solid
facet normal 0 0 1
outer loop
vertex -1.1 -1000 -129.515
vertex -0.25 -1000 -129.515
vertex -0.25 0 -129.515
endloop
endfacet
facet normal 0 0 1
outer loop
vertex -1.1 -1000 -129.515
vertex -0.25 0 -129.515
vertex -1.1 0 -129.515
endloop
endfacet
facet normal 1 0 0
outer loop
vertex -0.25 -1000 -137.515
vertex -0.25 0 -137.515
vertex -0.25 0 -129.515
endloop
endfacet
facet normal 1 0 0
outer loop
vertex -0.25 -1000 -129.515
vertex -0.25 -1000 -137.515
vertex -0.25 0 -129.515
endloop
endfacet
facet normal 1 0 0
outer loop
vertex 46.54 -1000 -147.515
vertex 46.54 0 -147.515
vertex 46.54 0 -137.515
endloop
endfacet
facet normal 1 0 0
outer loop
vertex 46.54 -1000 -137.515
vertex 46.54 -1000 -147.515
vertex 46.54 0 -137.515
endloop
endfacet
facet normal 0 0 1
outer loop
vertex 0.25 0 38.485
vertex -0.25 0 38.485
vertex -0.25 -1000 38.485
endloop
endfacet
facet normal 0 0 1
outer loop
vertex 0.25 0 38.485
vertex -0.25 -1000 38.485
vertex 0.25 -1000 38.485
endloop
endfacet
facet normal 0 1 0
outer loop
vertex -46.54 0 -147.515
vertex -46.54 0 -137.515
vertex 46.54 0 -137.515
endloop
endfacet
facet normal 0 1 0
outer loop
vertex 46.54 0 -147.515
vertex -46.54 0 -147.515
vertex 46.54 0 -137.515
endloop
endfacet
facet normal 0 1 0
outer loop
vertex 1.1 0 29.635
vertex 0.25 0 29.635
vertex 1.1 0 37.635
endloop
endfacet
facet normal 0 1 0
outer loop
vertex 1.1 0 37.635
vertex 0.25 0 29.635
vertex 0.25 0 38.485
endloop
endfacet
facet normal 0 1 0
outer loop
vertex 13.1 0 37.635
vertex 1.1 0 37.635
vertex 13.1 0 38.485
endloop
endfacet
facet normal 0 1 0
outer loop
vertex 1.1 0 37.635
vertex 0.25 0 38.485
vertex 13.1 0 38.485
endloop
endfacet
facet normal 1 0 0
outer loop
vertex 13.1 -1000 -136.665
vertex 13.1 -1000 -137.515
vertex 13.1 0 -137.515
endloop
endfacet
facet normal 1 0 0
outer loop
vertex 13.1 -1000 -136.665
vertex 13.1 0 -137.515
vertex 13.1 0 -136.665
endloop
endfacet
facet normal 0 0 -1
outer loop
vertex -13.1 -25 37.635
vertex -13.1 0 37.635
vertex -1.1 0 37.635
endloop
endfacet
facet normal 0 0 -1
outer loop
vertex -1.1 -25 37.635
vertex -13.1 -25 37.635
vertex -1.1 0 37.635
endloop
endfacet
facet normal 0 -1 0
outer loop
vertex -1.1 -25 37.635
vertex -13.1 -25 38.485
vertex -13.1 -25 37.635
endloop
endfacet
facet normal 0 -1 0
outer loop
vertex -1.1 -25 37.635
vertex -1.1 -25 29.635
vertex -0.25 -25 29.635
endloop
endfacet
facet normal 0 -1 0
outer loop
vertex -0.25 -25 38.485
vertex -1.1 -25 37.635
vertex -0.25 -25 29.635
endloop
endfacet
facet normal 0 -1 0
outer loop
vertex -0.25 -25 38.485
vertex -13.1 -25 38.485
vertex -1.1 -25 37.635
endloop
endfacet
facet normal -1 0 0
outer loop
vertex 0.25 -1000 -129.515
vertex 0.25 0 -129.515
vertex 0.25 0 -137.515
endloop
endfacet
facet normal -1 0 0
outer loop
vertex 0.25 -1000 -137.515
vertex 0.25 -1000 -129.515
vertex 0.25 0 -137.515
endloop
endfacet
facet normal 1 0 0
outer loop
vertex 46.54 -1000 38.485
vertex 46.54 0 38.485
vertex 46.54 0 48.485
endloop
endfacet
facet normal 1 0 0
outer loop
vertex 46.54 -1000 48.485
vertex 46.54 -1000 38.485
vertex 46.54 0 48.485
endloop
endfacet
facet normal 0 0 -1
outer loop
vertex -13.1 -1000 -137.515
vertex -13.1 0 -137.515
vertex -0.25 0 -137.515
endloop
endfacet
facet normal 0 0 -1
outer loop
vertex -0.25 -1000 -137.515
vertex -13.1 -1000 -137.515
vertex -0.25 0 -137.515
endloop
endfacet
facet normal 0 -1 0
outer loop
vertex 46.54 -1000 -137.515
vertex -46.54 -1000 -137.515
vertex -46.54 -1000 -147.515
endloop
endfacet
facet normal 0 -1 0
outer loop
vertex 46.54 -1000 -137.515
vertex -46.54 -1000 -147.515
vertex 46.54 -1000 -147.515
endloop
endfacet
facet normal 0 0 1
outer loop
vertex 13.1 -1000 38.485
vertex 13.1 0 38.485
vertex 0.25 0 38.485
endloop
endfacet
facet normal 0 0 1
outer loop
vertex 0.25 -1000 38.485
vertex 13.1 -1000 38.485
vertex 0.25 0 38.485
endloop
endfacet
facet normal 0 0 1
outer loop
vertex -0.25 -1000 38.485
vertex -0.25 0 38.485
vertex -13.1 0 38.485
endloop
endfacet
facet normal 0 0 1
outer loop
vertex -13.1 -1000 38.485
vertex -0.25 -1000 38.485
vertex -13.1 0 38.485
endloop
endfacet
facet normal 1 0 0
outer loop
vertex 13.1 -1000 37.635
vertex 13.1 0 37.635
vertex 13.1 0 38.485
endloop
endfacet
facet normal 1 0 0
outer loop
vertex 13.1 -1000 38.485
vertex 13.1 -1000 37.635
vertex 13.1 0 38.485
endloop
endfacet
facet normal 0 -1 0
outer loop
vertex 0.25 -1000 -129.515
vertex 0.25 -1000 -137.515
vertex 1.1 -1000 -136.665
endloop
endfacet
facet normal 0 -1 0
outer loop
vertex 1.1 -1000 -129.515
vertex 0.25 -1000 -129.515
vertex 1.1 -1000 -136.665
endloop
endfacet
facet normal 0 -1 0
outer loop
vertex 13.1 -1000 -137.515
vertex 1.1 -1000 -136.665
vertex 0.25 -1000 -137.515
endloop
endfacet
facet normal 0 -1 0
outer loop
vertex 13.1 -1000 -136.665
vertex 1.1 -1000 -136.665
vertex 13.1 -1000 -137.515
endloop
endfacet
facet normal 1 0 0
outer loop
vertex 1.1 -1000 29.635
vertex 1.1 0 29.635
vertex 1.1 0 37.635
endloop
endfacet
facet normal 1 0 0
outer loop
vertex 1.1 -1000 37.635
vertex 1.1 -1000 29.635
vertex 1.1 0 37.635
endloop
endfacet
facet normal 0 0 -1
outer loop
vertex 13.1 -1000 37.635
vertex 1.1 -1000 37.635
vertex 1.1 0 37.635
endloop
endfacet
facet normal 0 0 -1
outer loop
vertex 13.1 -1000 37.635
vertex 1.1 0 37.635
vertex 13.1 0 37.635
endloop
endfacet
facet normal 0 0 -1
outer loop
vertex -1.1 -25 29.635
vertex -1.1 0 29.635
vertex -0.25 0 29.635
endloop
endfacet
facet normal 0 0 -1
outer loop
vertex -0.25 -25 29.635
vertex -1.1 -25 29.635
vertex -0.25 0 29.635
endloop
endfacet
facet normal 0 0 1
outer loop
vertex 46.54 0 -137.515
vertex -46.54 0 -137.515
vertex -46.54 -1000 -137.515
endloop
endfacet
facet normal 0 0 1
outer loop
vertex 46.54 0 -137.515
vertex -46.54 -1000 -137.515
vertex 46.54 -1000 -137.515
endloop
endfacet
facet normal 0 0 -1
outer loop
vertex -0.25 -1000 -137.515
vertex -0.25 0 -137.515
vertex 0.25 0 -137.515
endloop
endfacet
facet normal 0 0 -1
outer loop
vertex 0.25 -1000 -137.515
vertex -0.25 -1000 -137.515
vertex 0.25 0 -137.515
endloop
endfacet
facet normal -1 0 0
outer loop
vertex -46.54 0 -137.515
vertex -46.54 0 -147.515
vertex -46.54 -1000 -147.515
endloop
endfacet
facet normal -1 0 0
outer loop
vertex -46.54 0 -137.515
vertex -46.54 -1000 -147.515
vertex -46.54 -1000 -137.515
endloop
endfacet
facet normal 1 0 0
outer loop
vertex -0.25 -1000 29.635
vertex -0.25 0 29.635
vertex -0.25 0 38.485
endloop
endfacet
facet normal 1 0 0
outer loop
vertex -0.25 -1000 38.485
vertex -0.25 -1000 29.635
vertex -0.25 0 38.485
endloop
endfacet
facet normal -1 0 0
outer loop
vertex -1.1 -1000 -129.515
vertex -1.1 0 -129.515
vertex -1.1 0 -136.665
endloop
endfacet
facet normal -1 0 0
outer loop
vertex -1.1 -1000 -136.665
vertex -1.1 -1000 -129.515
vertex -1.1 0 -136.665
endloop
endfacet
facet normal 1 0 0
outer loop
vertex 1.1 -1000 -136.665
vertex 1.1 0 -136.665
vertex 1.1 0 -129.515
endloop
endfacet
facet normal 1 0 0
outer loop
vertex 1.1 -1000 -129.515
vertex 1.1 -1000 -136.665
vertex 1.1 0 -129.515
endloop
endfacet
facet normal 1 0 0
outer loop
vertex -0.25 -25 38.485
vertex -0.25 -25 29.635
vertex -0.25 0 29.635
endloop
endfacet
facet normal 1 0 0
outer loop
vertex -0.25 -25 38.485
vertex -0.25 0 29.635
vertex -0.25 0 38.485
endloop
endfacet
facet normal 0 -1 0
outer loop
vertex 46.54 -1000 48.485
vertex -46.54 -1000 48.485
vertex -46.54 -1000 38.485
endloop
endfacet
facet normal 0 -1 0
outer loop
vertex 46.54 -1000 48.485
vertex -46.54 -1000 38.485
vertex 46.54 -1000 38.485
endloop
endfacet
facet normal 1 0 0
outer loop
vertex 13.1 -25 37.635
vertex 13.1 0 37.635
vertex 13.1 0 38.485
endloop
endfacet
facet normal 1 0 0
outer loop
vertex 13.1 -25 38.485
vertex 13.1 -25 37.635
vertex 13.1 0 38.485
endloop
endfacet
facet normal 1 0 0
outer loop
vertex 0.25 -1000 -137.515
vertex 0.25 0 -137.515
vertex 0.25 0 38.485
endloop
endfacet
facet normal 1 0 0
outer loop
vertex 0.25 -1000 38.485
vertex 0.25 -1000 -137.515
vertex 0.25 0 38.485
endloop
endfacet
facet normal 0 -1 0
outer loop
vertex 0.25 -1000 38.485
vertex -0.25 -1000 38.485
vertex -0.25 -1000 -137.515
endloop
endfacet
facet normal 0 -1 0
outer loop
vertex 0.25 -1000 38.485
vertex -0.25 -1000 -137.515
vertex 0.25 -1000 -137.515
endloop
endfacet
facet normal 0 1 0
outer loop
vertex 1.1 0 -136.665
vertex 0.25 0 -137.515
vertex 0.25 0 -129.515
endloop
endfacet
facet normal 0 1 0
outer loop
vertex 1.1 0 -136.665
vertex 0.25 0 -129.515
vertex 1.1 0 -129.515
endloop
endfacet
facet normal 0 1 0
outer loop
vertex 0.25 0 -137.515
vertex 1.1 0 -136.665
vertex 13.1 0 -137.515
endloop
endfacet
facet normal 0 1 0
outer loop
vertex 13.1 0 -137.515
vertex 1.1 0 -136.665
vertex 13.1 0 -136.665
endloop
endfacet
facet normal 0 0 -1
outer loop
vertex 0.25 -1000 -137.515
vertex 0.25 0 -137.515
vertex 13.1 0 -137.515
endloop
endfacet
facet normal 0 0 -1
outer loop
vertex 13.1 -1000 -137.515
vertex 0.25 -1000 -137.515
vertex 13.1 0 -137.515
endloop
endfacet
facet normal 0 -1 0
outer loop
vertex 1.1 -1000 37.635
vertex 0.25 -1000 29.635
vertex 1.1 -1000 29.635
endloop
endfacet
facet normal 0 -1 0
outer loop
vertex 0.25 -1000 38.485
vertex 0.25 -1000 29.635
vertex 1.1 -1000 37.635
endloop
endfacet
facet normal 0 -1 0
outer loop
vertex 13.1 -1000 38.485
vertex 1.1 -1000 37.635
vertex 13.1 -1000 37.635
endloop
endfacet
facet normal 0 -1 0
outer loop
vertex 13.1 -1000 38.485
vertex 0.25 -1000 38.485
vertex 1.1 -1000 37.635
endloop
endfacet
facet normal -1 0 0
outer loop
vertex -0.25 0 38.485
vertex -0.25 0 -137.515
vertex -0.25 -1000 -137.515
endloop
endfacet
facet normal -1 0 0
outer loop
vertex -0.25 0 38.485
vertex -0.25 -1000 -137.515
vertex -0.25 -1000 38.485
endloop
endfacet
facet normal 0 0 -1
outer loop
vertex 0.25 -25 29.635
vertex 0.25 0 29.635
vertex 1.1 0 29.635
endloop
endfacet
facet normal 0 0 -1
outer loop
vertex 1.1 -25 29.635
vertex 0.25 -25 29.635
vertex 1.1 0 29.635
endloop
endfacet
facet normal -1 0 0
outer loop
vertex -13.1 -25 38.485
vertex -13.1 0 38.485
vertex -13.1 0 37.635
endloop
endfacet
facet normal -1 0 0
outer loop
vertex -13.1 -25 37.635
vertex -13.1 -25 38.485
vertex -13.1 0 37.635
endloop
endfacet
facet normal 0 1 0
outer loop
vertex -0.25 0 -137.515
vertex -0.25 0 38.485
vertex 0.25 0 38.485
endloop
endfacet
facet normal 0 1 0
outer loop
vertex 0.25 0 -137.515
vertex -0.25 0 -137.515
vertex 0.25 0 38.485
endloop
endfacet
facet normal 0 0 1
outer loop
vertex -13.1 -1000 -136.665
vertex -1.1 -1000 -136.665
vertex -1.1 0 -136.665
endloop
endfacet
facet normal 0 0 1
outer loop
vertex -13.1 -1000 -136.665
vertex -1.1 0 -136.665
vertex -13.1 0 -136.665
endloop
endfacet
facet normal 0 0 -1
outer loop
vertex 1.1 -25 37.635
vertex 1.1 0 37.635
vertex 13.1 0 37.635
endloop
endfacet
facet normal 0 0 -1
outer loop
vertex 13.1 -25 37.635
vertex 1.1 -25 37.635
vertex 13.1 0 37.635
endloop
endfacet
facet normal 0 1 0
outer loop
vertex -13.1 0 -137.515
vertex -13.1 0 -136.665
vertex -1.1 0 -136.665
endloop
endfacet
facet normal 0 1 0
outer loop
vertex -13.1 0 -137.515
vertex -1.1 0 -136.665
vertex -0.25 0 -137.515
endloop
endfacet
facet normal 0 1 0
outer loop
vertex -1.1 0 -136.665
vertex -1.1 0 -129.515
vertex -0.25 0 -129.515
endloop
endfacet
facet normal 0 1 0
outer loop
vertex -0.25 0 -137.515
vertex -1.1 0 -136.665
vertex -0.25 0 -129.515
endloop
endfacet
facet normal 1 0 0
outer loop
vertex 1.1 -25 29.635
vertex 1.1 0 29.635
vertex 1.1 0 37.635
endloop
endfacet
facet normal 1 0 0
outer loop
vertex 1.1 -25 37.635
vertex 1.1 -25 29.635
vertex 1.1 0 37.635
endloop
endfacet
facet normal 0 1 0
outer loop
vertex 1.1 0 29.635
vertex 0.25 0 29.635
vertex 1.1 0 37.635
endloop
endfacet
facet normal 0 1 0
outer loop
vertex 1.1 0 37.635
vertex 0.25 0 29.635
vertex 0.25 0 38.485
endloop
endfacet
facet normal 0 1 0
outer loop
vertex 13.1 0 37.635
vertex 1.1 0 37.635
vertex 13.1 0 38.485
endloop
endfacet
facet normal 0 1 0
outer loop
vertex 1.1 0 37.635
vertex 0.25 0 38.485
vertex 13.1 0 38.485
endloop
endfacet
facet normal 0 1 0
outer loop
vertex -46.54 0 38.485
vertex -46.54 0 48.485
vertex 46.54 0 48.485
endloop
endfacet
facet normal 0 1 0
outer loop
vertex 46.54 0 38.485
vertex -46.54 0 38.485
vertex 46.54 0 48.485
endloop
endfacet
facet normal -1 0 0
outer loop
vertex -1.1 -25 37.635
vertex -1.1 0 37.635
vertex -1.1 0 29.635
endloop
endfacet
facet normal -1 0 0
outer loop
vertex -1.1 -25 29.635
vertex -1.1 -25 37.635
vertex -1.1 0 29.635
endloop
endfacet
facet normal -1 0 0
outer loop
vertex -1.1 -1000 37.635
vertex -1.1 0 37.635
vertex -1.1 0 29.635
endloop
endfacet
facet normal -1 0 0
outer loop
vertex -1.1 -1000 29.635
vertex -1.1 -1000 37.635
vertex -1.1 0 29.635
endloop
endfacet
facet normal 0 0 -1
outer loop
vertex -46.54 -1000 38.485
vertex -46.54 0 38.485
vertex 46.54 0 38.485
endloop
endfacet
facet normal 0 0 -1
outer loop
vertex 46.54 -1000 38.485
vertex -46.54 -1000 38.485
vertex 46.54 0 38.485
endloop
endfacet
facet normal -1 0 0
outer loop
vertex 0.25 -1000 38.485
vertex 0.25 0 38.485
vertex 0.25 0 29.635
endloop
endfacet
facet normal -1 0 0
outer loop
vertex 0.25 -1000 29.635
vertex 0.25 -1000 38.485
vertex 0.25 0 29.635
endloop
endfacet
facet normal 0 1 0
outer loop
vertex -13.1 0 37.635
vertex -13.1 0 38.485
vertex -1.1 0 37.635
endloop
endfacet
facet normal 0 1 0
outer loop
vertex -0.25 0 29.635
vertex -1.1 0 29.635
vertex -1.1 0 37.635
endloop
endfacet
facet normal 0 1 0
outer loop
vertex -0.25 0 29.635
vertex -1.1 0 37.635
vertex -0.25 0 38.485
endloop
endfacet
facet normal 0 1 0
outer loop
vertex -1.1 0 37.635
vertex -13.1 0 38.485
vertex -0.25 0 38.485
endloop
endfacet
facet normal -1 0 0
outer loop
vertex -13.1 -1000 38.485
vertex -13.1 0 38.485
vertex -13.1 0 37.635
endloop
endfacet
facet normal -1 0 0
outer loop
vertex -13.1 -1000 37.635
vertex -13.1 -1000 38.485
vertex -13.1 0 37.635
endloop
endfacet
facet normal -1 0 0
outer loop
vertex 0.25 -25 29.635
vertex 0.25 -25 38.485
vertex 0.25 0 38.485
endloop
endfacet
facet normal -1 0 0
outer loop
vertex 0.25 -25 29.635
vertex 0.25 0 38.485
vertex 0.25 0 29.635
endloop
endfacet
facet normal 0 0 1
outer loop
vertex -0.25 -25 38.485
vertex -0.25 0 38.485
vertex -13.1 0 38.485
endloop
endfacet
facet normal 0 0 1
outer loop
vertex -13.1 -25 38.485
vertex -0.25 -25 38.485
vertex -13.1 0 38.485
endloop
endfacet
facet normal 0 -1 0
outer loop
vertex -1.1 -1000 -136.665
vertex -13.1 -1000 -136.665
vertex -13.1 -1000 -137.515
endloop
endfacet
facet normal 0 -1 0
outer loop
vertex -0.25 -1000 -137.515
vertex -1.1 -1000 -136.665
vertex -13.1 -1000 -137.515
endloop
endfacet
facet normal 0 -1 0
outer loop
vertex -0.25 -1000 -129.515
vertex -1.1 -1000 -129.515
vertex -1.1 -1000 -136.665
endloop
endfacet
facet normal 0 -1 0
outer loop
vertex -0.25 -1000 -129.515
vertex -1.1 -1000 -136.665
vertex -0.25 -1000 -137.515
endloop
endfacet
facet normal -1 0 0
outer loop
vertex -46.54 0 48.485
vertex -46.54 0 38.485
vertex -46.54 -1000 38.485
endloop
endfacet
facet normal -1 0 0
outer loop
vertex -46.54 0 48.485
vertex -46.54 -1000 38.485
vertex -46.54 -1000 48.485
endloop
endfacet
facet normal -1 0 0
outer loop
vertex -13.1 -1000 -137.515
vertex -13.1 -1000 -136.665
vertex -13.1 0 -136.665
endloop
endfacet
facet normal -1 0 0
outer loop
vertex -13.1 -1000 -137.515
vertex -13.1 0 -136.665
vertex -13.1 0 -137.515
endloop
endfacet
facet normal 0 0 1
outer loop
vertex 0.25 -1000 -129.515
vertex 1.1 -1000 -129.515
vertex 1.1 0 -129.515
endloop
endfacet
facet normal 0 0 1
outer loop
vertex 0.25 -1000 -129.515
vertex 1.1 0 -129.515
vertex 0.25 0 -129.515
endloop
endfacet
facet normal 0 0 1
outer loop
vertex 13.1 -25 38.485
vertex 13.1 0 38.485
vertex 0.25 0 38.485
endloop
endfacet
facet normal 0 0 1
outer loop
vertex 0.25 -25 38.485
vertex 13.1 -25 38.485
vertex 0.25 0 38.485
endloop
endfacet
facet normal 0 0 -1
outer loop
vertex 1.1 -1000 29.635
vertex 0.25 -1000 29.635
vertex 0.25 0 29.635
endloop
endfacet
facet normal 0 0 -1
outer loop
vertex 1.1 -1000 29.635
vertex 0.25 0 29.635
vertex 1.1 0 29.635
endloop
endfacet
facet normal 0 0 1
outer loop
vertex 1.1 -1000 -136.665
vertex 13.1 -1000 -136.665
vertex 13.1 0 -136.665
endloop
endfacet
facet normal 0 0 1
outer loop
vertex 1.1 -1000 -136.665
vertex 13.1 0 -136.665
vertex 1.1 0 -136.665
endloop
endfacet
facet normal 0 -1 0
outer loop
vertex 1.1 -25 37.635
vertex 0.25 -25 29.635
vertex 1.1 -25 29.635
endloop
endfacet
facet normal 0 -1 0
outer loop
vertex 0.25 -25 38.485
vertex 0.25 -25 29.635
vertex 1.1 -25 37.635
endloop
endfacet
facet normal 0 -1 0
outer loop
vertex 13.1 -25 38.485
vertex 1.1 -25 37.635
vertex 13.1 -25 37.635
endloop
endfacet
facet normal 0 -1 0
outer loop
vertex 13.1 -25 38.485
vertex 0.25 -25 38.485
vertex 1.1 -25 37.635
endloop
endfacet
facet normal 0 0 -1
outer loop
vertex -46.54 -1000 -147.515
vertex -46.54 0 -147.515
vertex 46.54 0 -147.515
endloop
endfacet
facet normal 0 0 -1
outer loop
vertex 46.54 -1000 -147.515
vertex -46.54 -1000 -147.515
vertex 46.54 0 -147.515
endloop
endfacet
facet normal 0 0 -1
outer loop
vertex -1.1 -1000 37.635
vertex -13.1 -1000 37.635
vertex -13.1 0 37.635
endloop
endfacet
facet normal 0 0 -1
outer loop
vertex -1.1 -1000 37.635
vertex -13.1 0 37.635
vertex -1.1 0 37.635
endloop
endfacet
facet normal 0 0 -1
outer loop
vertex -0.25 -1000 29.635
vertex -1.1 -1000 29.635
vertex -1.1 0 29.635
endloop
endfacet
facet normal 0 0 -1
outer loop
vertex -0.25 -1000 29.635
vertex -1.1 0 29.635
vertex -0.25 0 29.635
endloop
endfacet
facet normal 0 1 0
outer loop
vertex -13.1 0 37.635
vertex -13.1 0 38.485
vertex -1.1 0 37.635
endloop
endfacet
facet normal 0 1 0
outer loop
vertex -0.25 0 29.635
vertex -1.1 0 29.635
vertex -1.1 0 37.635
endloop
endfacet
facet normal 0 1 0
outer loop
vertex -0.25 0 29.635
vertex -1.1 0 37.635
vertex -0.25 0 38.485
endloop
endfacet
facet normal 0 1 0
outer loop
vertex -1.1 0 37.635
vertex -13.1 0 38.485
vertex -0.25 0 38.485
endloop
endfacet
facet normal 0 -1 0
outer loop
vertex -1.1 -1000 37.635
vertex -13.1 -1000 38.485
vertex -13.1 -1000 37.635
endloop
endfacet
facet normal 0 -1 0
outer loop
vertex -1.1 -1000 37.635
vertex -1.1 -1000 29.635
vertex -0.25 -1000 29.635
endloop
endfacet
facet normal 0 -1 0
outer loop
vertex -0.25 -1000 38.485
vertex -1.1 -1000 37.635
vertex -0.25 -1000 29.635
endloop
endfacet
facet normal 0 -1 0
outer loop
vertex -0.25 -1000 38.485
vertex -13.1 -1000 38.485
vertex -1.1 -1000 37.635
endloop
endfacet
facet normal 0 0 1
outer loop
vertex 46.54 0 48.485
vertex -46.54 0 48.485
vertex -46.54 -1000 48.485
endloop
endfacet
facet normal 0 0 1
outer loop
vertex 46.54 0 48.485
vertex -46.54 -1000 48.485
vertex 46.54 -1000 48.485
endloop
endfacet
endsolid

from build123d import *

# Parameters (mm, degrees)
F1_W      = 0.5
F1_H      = 176
F3_DEPTH  = 1000
F2_W      = 93.08
F2_H      = 10
F0_W      = 93.08
F0_H      = 10
F5_DEPTH  = 1000
F7_DEPTH  = 1000
F8_DEPTH  = 25
F10_DEPTH = 1000


with BuildPart() as f3:
    # F1 (on Front) → F3 (new body)
    with BuildSketch(Plane.XZ):
        with Locations((0, -49.5153535176)):
            Rectangle(F1_W, F1_H)
    extrude(amount=F3_DEPTH)


with BuildPart() as f3b:
    # F2 (on Front) → F3, piece 2 (new body)
    with BuildSketch(Plane.XZ):
        with Locations((0, -142.5153535176)):
            Rectangle(F2_W, F2_H)
    extrude(amount=F3_DEPTH)


with BuildPart() as f3c:
    # F0 (on Front) → F3, piece 3 (new body)
    with BuildSketch(Plane.XZ):
        with Locations((0, 43.4846464824)):
            Rectangle(F0_W, F0_H)
    extrude(amount=F3_DEPTH)


with BuildPart() as f5:
    # F4 (on Front) → F5 (new body)
    with BuildSketch(Plane.XZ):
        Polygon((-13.1, -136.6653535176), (-13.1, -137.5153535176), (-0.25, -137.5153535176), (-0.25, -129.5153535176), (-1.1, -129.5153535176), (-1.1, -136.6653535176), align=None)
    extrude(amount=F5_DEPTH)


with BuildPart() as f7:
    # F6 (on Front) → F7 (new body)
    with BuildSketch(Plane.XZ):
        Polygon((-0.25, 38.4846464824), (-13.1, 38.4846464824), (-13.1, 37.6346464824), (-1.1, 37.6346464824), (-1.1, 29.6346464824), (-0.25, 29.6346464824), align=None)
    extrude(amount=F7_DEPTH)


with BuildPart() as f7b:
    # F6 (on Front) → F7, piece 2 (new body)
    with BuildSketch(Plane.XZ):
        Polygon((0.25, 38.4846464824), (0.25, 29.6346464824), (1.1, 29.6346464824), (1.1, 37.6346464824), (13.1, 37.6346464824), (13.1, 38.4846464824), align=None)
    extrude(amount=F7_DEPTH)


with BuildPart() as f8:
    # F6 (on Front) → F8 (new body)
    with BuildSketch(Plane.XZ):
        Polygon((-0.25, 38.4846464824), (-13.1, 38.4846464824), (-13.1, 37.6346464824), (-1.1, 37.6346464824), (-1.1, 29.6346464824), (-0.25, 29.6346464824), align=None)
    extrude(amount=F8_DEPTH)


with BuildPart() as f8b:
    # F6 (on Front) → F8, piece 2 (new body)
    with BuildSketch(Plane.XZ):
        Polygon((0.25, 38.4846464824), (0.25, 29.6346464824), (1.1, 29.6346464824), (1.1, 37.6346464824), (13.1, 37.6346464824), (13.1, 38.4846464824), align=None)
    extrude(amount=F8_DEPTH)


with BuildPart() as f10:
    # F9 (on Front) → F10 (new body)
    with BuildSketch(Plane.XZ):
        Polygon((1.1, -129.5153535176), (0.25, -129.5153535176), (0.25, -137.5153535176), (13.1, -137.5153535176), (13.1, -136.6653535176), (1.1, -136.6653535176), align=None)
    extrude(amount=F10_DEPTH)


solid = Compound([f3.part, f3b.part, f3c.part, f5.part, f7.part, f7b.part, f8.part, f8b.part, f10.part])
